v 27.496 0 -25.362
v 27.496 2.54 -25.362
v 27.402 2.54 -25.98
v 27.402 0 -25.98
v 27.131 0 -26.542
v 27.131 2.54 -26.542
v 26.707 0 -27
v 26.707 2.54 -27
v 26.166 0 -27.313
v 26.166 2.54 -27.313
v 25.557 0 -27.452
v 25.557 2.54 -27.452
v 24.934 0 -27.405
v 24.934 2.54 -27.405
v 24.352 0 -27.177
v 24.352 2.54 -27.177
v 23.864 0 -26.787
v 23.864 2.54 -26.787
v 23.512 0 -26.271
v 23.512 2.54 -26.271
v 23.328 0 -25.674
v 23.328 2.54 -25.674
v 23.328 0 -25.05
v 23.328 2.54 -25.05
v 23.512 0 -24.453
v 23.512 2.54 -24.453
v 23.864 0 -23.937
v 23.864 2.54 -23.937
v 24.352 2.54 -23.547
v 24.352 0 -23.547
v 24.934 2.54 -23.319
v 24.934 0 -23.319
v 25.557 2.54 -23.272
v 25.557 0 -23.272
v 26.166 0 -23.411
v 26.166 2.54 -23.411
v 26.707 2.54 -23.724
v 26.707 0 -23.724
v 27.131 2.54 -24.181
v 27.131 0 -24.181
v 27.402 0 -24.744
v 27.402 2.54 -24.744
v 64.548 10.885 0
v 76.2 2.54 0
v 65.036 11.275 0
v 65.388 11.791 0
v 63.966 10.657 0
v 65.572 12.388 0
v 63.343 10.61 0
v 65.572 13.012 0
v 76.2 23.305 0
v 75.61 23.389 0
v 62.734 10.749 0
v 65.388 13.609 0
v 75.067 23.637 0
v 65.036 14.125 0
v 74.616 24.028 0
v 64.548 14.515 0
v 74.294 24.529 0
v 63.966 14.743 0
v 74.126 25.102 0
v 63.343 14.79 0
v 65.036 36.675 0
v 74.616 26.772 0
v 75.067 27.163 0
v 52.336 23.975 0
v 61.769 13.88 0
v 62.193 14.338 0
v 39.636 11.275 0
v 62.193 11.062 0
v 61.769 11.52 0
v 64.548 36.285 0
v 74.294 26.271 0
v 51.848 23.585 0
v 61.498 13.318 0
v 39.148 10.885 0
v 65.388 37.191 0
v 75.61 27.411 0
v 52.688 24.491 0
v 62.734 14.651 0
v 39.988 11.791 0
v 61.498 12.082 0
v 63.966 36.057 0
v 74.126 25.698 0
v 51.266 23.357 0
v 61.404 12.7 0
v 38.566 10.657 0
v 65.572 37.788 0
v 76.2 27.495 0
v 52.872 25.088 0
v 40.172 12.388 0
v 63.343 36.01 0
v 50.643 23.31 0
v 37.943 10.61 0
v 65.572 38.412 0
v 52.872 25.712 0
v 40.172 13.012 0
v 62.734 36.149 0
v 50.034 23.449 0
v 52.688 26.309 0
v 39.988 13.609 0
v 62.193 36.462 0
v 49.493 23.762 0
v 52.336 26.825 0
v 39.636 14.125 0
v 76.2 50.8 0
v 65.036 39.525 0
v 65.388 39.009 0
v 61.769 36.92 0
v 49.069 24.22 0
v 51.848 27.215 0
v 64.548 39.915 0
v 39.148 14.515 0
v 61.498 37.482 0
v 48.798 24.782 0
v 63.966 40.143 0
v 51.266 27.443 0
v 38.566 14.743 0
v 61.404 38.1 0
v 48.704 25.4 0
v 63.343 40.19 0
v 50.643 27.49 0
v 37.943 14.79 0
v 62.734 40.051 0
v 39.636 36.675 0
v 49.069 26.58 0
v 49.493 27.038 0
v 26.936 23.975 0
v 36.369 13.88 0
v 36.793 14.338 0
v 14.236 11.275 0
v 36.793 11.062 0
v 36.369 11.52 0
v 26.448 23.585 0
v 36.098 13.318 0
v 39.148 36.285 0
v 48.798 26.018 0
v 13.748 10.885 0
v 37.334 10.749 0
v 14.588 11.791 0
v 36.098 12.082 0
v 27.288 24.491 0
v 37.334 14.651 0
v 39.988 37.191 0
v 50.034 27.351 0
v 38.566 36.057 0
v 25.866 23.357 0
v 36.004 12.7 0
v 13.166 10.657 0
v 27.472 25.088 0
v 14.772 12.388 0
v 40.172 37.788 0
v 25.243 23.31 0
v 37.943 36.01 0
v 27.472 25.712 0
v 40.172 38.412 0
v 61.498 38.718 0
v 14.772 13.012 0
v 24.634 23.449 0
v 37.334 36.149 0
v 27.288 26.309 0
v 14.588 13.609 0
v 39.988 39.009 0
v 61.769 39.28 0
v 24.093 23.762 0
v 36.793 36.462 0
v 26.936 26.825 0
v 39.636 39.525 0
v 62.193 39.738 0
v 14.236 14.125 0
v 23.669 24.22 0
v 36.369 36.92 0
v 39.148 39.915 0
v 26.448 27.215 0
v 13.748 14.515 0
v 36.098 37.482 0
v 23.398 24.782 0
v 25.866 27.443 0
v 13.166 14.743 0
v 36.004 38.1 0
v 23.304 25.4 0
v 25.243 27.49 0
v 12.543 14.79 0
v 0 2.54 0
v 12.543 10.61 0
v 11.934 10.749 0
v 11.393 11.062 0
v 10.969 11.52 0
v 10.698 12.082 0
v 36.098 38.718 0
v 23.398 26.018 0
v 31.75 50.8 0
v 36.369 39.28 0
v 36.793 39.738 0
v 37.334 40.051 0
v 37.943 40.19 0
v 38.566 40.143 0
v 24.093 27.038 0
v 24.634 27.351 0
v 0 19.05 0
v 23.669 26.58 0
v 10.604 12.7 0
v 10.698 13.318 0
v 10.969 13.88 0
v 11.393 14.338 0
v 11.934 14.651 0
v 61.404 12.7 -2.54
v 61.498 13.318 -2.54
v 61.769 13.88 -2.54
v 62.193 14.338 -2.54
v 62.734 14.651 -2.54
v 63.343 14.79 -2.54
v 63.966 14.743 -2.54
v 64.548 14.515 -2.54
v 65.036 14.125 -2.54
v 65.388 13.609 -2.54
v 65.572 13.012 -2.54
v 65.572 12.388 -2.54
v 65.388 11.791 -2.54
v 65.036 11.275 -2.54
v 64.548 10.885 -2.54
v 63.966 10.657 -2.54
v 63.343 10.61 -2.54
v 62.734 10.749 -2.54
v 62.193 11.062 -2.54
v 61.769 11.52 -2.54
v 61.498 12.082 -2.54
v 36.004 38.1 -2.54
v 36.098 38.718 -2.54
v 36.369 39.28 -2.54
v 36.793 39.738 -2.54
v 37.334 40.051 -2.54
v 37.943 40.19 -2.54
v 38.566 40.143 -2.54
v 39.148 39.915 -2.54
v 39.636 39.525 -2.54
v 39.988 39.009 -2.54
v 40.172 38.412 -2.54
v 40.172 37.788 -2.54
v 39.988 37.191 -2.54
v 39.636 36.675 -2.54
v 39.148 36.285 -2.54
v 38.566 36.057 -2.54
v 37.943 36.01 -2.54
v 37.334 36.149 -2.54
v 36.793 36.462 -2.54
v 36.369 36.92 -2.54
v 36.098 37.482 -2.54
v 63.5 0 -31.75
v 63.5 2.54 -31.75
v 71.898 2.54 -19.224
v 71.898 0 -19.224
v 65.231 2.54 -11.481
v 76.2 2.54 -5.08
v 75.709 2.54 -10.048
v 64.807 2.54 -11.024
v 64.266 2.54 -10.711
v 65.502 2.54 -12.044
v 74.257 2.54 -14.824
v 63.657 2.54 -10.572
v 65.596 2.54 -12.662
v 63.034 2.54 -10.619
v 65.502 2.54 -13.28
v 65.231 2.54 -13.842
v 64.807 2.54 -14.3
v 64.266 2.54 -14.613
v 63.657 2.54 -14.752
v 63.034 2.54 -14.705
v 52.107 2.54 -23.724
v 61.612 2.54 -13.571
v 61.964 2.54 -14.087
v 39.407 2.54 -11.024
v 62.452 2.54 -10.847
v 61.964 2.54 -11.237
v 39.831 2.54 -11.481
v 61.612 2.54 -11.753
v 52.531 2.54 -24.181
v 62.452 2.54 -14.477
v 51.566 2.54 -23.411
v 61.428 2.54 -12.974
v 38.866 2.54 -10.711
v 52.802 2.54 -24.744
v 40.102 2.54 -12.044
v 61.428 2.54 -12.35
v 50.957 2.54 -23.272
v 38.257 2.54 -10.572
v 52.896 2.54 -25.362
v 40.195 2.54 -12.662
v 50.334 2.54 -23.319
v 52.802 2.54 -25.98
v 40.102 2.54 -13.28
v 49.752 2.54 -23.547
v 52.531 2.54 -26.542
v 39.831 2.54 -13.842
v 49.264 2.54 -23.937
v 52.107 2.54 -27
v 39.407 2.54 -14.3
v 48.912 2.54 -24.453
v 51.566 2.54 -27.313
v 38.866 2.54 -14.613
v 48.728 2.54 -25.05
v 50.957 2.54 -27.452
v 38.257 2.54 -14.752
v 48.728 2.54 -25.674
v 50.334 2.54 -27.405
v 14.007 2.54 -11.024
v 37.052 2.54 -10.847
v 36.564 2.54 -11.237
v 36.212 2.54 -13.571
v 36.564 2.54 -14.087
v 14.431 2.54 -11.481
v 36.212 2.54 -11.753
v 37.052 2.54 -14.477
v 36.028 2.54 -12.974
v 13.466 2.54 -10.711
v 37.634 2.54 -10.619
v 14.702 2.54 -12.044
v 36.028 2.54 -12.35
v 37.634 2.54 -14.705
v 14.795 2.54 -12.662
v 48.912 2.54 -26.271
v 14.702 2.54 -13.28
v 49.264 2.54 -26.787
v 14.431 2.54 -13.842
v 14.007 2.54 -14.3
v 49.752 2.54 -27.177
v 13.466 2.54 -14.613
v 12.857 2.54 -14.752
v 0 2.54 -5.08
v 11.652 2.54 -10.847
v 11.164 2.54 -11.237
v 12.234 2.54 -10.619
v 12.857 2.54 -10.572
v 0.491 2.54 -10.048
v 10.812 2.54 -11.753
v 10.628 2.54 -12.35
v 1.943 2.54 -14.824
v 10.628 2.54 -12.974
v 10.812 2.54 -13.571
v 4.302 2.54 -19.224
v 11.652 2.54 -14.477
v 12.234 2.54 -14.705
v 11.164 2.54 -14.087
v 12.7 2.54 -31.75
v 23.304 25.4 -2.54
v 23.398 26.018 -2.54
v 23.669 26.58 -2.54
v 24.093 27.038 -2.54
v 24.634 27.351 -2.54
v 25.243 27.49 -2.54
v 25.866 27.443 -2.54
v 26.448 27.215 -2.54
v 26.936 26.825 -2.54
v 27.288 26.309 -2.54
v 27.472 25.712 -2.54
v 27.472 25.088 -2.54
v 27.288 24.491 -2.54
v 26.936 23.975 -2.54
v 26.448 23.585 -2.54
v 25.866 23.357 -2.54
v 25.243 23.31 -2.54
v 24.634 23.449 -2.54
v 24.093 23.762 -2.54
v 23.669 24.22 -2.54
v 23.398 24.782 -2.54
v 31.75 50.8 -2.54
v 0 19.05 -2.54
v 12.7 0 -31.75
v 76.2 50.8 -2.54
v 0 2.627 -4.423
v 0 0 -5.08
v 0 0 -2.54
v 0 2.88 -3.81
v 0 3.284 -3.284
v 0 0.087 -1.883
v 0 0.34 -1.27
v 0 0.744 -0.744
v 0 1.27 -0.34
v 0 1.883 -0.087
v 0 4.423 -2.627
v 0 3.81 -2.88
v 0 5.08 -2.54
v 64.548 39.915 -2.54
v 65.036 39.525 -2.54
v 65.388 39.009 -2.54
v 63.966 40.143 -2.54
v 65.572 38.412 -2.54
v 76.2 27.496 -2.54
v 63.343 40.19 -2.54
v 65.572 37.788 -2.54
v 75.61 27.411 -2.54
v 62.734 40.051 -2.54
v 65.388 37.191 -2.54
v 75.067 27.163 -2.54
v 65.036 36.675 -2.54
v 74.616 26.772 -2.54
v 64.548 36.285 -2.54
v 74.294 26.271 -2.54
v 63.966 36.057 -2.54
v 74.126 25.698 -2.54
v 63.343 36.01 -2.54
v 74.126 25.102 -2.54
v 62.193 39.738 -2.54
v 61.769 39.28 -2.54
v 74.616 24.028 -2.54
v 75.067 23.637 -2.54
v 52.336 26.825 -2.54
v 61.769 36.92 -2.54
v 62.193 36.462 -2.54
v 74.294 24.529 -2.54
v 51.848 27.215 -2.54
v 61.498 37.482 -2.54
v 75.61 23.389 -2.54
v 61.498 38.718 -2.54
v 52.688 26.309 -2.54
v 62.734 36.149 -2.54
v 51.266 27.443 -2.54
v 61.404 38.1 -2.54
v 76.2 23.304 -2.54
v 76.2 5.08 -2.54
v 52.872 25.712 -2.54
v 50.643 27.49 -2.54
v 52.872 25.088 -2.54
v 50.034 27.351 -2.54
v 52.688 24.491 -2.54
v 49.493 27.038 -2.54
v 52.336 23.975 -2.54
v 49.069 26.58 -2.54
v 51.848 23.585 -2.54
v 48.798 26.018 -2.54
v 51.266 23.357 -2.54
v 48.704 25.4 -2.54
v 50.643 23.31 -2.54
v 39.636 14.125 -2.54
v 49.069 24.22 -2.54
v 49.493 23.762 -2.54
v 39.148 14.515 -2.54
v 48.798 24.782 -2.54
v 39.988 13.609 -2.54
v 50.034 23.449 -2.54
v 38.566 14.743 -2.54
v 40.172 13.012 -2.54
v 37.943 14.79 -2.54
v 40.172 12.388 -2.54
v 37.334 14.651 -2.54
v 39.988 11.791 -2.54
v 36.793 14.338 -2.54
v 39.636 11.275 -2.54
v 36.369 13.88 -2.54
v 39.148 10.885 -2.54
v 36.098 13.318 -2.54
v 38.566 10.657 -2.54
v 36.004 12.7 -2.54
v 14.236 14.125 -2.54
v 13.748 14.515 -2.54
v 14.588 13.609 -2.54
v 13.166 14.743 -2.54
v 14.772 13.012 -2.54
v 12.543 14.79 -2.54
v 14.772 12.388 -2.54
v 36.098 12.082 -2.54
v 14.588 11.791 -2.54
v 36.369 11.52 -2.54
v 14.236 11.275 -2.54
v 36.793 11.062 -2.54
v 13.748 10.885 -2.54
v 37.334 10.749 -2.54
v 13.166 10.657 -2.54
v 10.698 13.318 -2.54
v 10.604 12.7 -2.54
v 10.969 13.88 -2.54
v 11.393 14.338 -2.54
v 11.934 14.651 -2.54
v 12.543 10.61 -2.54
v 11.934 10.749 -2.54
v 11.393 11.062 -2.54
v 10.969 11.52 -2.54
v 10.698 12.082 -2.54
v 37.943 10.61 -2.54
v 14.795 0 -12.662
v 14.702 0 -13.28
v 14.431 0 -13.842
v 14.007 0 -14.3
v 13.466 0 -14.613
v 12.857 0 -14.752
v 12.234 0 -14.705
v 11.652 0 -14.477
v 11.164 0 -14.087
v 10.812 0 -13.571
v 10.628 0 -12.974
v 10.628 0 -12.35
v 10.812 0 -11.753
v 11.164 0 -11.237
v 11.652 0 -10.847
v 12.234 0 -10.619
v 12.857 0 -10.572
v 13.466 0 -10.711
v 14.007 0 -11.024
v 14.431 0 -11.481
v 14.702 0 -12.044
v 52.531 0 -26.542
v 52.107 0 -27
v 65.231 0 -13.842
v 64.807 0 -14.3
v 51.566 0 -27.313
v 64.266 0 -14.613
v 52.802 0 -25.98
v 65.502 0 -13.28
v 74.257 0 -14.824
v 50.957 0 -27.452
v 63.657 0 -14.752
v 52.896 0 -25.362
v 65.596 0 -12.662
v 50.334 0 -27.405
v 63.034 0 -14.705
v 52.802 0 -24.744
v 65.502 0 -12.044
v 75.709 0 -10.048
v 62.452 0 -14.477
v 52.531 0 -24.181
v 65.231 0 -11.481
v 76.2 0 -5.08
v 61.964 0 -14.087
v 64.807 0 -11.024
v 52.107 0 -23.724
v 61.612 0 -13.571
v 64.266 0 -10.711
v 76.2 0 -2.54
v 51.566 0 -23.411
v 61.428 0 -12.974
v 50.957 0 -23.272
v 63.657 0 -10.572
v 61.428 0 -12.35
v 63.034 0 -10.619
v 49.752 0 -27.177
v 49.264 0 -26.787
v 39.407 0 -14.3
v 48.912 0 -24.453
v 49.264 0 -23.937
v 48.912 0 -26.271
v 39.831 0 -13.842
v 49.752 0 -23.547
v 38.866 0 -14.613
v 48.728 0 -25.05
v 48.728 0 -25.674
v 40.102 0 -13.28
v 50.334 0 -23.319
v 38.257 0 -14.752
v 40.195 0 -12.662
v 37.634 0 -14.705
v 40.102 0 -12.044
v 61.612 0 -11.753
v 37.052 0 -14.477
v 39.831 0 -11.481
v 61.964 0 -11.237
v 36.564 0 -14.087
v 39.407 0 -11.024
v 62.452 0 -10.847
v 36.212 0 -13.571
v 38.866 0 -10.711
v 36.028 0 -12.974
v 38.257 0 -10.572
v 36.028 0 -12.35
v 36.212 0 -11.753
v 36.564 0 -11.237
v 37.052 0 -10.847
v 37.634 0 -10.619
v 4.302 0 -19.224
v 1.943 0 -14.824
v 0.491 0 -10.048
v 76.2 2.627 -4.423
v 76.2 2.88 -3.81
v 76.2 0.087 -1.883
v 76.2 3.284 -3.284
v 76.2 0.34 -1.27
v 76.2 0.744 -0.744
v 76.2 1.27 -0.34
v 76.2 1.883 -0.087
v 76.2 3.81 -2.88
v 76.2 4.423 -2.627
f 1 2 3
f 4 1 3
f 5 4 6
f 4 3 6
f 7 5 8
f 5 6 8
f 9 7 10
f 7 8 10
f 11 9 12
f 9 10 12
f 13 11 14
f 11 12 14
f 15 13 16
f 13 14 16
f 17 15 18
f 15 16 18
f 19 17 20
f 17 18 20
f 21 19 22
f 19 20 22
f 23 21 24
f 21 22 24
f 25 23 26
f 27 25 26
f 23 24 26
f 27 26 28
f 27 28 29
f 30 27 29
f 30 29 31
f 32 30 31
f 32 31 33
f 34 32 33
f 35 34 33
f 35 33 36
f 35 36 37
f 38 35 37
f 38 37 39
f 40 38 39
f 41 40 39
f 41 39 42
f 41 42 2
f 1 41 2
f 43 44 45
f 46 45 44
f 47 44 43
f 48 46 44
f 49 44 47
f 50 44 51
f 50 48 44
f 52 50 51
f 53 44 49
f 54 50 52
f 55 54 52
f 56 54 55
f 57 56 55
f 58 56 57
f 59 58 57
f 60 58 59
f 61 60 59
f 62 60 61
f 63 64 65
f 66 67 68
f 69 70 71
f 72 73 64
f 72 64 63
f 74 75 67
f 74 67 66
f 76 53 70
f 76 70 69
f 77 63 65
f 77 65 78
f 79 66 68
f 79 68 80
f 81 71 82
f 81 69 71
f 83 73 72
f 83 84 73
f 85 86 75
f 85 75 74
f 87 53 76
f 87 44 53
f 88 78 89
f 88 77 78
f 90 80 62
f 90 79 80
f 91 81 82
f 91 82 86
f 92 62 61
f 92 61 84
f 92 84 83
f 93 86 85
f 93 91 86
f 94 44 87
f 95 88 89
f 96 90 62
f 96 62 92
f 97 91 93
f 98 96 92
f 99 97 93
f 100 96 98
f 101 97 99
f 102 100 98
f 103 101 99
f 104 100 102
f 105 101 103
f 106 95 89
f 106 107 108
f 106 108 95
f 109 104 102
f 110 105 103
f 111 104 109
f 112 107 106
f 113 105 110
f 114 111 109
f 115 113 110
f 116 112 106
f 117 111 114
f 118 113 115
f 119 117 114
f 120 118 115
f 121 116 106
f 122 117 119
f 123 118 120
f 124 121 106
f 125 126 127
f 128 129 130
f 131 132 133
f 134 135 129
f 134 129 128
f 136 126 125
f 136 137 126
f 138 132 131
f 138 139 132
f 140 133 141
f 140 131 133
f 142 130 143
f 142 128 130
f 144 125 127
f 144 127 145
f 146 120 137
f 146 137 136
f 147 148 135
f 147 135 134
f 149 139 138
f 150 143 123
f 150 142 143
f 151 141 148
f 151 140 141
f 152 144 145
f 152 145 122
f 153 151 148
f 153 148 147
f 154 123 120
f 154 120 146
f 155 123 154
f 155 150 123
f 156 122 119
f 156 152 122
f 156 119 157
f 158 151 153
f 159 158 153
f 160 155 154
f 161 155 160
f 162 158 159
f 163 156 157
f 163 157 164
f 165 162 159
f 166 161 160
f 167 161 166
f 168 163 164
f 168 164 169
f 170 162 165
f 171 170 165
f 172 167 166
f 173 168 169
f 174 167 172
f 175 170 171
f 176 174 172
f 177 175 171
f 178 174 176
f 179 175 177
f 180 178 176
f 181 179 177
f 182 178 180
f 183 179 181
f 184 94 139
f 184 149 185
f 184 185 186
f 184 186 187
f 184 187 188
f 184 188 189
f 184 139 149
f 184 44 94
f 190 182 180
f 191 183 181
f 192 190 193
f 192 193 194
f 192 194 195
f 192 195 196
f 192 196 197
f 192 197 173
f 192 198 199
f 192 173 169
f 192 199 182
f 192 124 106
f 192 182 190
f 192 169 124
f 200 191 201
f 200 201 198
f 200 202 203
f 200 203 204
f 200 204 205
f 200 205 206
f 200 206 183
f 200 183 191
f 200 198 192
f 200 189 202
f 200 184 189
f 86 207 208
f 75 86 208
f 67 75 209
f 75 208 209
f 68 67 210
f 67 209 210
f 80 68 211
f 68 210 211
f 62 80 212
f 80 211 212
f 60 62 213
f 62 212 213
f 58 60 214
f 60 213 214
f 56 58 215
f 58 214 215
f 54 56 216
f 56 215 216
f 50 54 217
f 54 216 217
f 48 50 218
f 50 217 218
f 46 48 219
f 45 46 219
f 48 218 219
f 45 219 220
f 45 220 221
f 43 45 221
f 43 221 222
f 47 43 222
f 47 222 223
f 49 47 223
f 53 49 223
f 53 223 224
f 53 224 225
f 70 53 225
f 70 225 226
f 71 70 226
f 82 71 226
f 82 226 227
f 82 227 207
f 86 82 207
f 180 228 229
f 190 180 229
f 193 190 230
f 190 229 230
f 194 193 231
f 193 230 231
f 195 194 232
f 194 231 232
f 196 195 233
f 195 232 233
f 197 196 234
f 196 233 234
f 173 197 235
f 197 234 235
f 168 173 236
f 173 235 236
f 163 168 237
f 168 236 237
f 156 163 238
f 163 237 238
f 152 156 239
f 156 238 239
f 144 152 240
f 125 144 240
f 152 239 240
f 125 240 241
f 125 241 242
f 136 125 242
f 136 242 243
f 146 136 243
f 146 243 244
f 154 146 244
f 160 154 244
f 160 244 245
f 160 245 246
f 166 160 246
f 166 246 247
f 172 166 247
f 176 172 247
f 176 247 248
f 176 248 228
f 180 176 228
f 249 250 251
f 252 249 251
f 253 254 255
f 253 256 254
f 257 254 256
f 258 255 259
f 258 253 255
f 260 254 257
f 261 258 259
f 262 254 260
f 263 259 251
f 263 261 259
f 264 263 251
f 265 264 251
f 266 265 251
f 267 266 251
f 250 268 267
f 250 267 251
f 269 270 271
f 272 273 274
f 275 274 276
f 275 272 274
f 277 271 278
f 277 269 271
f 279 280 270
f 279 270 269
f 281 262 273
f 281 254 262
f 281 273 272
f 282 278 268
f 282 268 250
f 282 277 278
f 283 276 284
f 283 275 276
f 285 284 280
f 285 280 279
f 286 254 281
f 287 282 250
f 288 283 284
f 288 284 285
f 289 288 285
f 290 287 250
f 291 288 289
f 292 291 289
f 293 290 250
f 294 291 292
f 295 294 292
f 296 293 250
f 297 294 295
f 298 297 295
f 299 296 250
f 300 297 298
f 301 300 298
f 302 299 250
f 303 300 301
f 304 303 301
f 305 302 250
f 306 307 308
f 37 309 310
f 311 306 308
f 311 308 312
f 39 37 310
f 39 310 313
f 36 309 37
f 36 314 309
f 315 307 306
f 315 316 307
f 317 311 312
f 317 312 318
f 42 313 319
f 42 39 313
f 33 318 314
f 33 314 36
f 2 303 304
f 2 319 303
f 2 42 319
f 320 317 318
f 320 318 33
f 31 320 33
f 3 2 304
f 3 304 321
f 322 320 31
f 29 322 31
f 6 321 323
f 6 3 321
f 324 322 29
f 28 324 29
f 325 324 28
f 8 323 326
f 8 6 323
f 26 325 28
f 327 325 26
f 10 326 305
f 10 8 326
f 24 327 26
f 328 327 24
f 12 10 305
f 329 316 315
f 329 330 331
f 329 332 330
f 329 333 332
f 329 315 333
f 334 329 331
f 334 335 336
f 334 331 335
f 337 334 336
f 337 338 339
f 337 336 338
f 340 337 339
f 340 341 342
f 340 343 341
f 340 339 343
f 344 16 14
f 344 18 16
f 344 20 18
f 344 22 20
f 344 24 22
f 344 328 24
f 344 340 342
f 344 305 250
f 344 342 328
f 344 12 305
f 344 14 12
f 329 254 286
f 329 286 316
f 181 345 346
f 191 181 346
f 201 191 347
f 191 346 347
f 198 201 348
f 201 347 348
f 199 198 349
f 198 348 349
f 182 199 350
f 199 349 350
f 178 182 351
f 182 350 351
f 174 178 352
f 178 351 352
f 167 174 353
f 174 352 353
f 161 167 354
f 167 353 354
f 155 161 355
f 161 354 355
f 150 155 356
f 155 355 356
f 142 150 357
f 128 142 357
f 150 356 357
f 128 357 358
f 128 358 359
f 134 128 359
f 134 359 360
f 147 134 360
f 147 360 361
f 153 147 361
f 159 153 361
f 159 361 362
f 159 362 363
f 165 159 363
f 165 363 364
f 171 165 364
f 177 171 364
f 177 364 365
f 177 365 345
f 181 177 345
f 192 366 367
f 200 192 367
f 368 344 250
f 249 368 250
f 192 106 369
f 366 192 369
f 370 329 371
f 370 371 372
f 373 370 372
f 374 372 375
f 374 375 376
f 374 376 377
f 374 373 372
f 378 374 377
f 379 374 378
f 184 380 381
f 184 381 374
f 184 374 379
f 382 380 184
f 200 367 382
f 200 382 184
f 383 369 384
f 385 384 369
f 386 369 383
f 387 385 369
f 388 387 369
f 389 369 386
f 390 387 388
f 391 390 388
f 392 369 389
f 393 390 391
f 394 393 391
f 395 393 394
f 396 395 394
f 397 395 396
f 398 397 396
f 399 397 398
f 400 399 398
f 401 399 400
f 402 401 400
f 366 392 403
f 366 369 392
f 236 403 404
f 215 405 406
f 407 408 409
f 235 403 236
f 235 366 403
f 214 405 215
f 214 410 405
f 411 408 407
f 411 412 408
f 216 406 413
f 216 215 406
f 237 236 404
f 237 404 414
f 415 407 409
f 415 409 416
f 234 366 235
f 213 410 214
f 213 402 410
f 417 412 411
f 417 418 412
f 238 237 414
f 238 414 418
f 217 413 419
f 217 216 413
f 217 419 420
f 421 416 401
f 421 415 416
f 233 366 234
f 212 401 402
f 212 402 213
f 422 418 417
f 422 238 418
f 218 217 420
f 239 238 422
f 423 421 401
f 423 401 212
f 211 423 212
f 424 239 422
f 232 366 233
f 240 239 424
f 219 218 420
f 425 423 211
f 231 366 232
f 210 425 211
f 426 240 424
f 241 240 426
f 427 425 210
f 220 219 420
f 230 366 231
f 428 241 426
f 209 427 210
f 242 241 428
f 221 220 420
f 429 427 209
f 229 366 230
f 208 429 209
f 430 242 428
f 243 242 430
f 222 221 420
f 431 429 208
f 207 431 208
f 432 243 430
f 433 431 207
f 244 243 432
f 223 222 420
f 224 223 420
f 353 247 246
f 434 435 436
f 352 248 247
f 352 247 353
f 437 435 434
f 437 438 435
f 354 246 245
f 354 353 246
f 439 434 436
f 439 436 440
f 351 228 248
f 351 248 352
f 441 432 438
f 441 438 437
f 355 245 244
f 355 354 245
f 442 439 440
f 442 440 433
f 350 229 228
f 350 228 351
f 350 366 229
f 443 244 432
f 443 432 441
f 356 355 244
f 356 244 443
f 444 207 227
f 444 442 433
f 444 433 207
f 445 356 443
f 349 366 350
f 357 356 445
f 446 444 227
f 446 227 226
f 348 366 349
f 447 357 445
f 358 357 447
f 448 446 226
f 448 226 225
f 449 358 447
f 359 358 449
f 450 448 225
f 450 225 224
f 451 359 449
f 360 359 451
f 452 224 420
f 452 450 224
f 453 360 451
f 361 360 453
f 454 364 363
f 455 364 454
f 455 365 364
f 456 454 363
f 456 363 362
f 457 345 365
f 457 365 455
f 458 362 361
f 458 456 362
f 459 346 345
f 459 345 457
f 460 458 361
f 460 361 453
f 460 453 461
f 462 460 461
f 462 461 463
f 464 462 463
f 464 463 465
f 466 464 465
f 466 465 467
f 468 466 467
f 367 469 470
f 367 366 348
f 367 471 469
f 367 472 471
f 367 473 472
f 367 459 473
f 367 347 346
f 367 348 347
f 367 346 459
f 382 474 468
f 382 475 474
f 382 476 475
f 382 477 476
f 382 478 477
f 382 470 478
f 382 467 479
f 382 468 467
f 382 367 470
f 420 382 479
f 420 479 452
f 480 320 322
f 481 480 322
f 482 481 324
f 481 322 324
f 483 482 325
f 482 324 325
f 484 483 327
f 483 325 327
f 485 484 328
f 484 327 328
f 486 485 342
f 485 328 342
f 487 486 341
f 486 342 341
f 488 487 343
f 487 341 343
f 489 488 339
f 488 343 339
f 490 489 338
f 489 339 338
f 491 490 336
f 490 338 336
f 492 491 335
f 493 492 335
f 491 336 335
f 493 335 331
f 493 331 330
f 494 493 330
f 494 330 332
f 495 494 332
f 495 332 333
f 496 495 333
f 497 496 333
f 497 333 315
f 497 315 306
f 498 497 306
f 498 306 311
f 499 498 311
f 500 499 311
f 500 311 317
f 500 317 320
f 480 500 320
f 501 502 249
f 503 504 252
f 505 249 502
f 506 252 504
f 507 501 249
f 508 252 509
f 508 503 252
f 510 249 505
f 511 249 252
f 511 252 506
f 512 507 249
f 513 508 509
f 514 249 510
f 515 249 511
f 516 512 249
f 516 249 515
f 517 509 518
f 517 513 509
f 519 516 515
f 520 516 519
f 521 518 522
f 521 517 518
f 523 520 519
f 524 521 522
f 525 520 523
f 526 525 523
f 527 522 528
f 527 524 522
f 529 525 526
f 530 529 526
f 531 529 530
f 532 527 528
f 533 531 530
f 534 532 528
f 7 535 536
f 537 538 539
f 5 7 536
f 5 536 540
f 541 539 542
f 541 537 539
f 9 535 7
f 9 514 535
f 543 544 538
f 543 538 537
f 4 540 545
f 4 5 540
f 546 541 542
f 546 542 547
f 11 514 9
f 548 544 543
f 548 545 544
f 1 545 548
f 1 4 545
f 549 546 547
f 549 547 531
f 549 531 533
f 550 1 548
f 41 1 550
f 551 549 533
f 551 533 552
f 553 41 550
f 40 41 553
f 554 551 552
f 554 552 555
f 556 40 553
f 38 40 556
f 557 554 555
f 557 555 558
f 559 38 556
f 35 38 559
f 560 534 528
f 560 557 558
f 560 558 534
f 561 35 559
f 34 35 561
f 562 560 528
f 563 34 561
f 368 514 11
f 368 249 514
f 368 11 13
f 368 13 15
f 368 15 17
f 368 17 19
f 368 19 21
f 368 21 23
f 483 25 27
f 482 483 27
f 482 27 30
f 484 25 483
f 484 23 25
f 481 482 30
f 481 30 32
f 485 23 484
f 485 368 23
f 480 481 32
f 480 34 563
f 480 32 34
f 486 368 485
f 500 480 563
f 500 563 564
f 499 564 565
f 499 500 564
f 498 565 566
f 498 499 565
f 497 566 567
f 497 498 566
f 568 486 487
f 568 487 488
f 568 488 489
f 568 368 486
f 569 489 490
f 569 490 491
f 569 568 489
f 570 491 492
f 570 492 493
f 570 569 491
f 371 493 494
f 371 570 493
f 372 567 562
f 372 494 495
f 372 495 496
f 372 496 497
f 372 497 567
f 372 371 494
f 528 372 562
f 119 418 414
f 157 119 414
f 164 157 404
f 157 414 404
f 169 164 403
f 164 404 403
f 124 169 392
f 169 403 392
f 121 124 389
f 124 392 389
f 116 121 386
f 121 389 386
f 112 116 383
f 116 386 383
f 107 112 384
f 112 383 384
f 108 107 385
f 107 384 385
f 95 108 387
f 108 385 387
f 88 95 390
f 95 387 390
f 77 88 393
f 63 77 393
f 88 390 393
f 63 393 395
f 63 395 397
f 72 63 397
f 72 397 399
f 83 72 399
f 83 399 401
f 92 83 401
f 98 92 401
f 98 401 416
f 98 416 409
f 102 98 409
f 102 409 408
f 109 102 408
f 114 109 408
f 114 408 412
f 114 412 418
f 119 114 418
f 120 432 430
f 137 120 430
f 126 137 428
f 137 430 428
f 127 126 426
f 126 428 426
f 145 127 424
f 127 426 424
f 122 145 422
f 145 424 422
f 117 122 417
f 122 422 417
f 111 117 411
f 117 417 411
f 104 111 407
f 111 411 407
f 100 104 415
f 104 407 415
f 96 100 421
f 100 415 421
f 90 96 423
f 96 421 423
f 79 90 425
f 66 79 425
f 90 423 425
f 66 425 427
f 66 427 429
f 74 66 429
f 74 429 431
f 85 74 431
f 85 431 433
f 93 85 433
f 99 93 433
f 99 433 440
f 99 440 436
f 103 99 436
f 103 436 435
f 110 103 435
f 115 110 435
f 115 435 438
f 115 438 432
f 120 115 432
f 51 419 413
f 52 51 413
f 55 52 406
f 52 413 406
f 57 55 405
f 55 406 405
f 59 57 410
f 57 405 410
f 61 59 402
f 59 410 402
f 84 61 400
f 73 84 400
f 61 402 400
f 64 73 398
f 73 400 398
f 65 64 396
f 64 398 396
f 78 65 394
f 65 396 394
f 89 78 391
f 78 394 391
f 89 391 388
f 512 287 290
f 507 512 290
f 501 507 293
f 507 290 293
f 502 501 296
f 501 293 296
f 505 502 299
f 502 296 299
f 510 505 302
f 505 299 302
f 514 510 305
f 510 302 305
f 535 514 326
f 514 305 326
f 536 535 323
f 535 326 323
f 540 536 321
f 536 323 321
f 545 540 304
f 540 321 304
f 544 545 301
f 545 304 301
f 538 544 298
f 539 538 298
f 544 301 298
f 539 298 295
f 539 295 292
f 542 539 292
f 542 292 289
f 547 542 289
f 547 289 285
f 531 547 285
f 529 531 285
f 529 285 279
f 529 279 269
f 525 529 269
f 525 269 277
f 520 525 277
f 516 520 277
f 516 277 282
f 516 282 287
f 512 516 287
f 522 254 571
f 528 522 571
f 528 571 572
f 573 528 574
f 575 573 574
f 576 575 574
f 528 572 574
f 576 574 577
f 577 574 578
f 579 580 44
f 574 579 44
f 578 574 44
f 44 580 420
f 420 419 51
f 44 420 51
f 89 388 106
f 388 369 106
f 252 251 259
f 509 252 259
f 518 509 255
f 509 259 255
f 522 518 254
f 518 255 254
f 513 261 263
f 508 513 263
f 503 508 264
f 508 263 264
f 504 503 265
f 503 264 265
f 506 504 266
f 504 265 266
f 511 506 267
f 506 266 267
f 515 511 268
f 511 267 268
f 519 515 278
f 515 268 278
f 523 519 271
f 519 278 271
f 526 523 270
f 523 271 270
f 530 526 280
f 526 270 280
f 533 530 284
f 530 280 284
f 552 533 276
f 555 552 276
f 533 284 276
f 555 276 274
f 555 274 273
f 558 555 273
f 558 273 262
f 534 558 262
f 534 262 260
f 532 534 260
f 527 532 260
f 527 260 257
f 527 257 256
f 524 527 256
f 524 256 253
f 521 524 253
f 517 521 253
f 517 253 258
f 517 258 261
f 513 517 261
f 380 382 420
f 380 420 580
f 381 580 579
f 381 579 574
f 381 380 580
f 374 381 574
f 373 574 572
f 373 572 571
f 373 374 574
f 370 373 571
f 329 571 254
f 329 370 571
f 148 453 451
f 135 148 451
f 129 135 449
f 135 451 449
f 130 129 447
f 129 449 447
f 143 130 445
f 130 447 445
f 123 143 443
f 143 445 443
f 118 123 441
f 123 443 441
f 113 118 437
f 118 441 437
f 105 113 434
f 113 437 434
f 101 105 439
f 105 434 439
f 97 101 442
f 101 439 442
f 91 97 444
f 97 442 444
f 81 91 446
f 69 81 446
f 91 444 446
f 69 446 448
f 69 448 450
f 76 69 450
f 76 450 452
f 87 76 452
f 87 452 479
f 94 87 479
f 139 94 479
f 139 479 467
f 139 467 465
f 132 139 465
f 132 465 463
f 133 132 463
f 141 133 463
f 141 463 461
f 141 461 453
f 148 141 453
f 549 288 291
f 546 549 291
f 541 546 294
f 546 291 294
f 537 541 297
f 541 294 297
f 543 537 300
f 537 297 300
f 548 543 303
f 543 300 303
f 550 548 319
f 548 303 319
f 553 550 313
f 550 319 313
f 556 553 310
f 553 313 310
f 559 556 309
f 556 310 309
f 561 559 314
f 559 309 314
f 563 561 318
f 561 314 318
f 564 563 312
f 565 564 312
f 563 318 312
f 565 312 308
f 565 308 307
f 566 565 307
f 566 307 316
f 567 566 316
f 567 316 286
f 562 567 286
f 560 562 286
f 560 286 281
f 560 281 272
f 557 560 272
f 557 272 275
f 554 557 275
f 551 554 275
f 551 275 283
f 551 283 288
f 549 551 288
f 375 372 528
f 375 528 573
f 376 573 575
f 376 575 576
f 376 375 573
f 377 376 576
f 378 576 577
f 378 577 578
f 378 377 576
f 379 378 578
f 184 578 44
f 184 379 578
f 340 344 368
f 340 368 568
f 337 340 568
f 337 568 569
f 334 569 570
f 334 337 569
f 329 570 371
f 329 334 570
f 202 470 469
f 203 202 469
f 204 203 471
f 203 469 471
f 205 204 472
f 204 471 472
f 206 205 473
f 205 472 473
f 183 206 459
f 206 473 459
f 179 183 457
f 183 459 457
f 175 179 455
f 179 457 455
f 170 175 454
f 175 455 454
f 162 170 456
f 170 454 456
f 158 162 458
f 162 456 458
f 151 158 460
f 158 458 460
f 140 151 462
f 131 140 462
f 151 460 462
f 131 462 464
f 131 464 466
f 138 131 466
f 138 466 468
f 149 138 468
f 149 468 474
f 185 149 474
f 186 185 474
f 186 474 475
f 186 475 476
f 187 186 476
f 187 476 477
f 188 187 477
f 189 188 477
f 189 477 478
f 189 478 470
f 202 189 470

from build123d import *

# Parameters (mm, degrees)
BOSS_EXTRUDE1_DEPTH     = 76.2
SKETCH2_R               = 2.0955
CUT_EXTRUDE1_DEPTH      = 3.54
LPATTERN1_COUNT         = 3
LPATTERN1_PITCH         = 25.4
SKETCH3_R               = 2.0955
CUT_EXTRUDE2_DEPTH      = 3.54
LPATTERN2_COUNT         = 3
LPATTERN2_PITCH         = 25.4
SKETCH4_W               = 76.2
SKETCH4_H               = 19.05
CUT_EXTRUDE3_DEPTH      = 3.54
CUT_EXTRUDE5_DEPTH      = 3.54
CUT_EXTRUDE6_DEPTH      = 49.26
CUT_EXTRUDE6_DEPTH_BACK = 3.54


with BuildPart() as part:
    # Sketch1 → Boss-Extrude1 (new body)
    with BuildSketch(Plane(origin=(0, 0, 0), x_dir=(0, 0, -1), z_dir=(1, 0, 0))):
        with BuildLine():
            Line((0, 2.54), (0, 50.8))
            Line((0, 50.8), (2.54, 50.8))
            Line((2.54, 50.8), (2.54, 5.08))
            ThreePointArc((2.54, 5.08), (3.283948776, 3.283948776), (5.08, 2.54))
            Line((5.08, 2.54), (50.8, 2.54))
            Line((50.8, 2.54), (50.8, 0))
            Line((50.8, 0), (2.54, 0))
            ThreePointArc((2.54, 0), (0.743948776, 0.743948776), (0, 2.54))
        make_face()
    extrude(amount=BOSS_EXTRUDE1_DEPTH)

    # Sketch2 → Cut-Extrude1 (cut, through all)
    with BuildSketch(Plane(origin=(0, 2.54, 0), x_dir=(1, 0, 0), z_dir=(0, 1, 0))):
        with Locations((12.7, 38.0619)):
            Circle(SKETCH2_R)
        with Locations((12.7, 12.6619)):
            Circle(SKETCH2_R)
        with Locations((25.4, 25.3619)):
            Circle(SKETCH2_R)
    cut_extrude1 = extrude(amount=-CUT_EXTRUDE1_DEPTH, mode=Mode.SUBTRACT)

    # LPattern1: Cut-Extrude1 ×3
    with Locations(*[(i * LPATTERN1_PITCH, 0, 0) for i in range(1, LPATTERN1_COUNT)]):
        add(cut_extrude1, mode=Mode.SUBTRACT)

    # Sketch3 → Cut-Extrude2 (cut, through all)
    with BuildSketch(Plane(origin=(0, 0, -2.54), x_dir=(-1, 0, 0), z_dir=(0, 0, -1))):
        with Locations((-12.7, 38.1)):
            Circle(SKETCH3_R)
        with Locations((-12.7, 12.7)):
            Circle(SKETCH3_R)
        with Locations((-25.4, 25.4)):
            Circle(SKETCH3_R)
    cut_extrude2 = extrude(amount=-CUT_EXTRUDE2_DEPTH, mode=Mode.SUBTRACT)

    # LPattern2: Cut-Extrude2 ×3
    with Locations(*[(i * LPATTERN2_PITCH, 0, 0) for i in range(1, LPATTERN2_COUNT)]):
        add(cut_extrude2, mode=Mode.SUBTRACT)

    # Sketch4 → Cut-Extrude3 (cut, through all)
    with BuildSketch(Plane(origin=(0, 2.54, 0), x_dir=(1, 0, 0), z_dir=(0, 1, 0))):
        with Locations((38.1, 41.275)):
            Rectangle(SKETCH4_W, SKETCH4_H)
    extrude(amount=-CUT_EXTRUDE3_DEPTH, mode=Mode.SUBTRACT)

    # Sketch6 → Cut-Extrude5 (cut, through all)
    with BuildSketch(Plane(origin=(0, 0, -2.54), x_dir=(-1, 0, 0), z_dir=(0, 0, -1))):
        Polygon((0, 19.05), (0, 50.8), (-31.75, 50.8), align=None)
    extrude(amount=-CUT_EXTRUDE5_DEPTH, mode=Mode.SUBTRACT)

    # Sketch7 → Cut-Extrude6 (cut, two sides)
    with BuildSketch(Plane(origin=(0, 2.54, 0), x_dir=(1, 0, 0), z_dir=(0, 1, 0))) as cut_extrude6_sk:
        with BuildLine():
            Line((63.5, 31.75), (71.897549111, 19.224024233))
            ThreePointArc((71.897549111, 19.224024233), (75.100594102, 12.471963629), (76.2, 5.08))
            Line((76.2, 5.08), (76.2, 31.75))
            Line((76.2, 31.75), (63.5, 31.75))
        make_face()
        with BuildLine():
            Line((12.7, 31.75), (4.302450889, 19.224024233))
            ThreePointArc((4.302450889, 19.224024233), (1.099405898, 12.471963629), (0, 5.08))
            Line((0, 5.08), (0, 31.75))
            Line((0, 31.75), (12.7, 31.75))
        make_face()
    extrude(amount=CUT_EXTRUDE6_DEPTH, mode=Mode.SUBTRACT)
    extrude(cut_extrude6_sk.sketch, amount=-CUT_EXTRUDE6_DEPTH_BACK, mode=Mode.SUBTRACT)


solid = part.part
